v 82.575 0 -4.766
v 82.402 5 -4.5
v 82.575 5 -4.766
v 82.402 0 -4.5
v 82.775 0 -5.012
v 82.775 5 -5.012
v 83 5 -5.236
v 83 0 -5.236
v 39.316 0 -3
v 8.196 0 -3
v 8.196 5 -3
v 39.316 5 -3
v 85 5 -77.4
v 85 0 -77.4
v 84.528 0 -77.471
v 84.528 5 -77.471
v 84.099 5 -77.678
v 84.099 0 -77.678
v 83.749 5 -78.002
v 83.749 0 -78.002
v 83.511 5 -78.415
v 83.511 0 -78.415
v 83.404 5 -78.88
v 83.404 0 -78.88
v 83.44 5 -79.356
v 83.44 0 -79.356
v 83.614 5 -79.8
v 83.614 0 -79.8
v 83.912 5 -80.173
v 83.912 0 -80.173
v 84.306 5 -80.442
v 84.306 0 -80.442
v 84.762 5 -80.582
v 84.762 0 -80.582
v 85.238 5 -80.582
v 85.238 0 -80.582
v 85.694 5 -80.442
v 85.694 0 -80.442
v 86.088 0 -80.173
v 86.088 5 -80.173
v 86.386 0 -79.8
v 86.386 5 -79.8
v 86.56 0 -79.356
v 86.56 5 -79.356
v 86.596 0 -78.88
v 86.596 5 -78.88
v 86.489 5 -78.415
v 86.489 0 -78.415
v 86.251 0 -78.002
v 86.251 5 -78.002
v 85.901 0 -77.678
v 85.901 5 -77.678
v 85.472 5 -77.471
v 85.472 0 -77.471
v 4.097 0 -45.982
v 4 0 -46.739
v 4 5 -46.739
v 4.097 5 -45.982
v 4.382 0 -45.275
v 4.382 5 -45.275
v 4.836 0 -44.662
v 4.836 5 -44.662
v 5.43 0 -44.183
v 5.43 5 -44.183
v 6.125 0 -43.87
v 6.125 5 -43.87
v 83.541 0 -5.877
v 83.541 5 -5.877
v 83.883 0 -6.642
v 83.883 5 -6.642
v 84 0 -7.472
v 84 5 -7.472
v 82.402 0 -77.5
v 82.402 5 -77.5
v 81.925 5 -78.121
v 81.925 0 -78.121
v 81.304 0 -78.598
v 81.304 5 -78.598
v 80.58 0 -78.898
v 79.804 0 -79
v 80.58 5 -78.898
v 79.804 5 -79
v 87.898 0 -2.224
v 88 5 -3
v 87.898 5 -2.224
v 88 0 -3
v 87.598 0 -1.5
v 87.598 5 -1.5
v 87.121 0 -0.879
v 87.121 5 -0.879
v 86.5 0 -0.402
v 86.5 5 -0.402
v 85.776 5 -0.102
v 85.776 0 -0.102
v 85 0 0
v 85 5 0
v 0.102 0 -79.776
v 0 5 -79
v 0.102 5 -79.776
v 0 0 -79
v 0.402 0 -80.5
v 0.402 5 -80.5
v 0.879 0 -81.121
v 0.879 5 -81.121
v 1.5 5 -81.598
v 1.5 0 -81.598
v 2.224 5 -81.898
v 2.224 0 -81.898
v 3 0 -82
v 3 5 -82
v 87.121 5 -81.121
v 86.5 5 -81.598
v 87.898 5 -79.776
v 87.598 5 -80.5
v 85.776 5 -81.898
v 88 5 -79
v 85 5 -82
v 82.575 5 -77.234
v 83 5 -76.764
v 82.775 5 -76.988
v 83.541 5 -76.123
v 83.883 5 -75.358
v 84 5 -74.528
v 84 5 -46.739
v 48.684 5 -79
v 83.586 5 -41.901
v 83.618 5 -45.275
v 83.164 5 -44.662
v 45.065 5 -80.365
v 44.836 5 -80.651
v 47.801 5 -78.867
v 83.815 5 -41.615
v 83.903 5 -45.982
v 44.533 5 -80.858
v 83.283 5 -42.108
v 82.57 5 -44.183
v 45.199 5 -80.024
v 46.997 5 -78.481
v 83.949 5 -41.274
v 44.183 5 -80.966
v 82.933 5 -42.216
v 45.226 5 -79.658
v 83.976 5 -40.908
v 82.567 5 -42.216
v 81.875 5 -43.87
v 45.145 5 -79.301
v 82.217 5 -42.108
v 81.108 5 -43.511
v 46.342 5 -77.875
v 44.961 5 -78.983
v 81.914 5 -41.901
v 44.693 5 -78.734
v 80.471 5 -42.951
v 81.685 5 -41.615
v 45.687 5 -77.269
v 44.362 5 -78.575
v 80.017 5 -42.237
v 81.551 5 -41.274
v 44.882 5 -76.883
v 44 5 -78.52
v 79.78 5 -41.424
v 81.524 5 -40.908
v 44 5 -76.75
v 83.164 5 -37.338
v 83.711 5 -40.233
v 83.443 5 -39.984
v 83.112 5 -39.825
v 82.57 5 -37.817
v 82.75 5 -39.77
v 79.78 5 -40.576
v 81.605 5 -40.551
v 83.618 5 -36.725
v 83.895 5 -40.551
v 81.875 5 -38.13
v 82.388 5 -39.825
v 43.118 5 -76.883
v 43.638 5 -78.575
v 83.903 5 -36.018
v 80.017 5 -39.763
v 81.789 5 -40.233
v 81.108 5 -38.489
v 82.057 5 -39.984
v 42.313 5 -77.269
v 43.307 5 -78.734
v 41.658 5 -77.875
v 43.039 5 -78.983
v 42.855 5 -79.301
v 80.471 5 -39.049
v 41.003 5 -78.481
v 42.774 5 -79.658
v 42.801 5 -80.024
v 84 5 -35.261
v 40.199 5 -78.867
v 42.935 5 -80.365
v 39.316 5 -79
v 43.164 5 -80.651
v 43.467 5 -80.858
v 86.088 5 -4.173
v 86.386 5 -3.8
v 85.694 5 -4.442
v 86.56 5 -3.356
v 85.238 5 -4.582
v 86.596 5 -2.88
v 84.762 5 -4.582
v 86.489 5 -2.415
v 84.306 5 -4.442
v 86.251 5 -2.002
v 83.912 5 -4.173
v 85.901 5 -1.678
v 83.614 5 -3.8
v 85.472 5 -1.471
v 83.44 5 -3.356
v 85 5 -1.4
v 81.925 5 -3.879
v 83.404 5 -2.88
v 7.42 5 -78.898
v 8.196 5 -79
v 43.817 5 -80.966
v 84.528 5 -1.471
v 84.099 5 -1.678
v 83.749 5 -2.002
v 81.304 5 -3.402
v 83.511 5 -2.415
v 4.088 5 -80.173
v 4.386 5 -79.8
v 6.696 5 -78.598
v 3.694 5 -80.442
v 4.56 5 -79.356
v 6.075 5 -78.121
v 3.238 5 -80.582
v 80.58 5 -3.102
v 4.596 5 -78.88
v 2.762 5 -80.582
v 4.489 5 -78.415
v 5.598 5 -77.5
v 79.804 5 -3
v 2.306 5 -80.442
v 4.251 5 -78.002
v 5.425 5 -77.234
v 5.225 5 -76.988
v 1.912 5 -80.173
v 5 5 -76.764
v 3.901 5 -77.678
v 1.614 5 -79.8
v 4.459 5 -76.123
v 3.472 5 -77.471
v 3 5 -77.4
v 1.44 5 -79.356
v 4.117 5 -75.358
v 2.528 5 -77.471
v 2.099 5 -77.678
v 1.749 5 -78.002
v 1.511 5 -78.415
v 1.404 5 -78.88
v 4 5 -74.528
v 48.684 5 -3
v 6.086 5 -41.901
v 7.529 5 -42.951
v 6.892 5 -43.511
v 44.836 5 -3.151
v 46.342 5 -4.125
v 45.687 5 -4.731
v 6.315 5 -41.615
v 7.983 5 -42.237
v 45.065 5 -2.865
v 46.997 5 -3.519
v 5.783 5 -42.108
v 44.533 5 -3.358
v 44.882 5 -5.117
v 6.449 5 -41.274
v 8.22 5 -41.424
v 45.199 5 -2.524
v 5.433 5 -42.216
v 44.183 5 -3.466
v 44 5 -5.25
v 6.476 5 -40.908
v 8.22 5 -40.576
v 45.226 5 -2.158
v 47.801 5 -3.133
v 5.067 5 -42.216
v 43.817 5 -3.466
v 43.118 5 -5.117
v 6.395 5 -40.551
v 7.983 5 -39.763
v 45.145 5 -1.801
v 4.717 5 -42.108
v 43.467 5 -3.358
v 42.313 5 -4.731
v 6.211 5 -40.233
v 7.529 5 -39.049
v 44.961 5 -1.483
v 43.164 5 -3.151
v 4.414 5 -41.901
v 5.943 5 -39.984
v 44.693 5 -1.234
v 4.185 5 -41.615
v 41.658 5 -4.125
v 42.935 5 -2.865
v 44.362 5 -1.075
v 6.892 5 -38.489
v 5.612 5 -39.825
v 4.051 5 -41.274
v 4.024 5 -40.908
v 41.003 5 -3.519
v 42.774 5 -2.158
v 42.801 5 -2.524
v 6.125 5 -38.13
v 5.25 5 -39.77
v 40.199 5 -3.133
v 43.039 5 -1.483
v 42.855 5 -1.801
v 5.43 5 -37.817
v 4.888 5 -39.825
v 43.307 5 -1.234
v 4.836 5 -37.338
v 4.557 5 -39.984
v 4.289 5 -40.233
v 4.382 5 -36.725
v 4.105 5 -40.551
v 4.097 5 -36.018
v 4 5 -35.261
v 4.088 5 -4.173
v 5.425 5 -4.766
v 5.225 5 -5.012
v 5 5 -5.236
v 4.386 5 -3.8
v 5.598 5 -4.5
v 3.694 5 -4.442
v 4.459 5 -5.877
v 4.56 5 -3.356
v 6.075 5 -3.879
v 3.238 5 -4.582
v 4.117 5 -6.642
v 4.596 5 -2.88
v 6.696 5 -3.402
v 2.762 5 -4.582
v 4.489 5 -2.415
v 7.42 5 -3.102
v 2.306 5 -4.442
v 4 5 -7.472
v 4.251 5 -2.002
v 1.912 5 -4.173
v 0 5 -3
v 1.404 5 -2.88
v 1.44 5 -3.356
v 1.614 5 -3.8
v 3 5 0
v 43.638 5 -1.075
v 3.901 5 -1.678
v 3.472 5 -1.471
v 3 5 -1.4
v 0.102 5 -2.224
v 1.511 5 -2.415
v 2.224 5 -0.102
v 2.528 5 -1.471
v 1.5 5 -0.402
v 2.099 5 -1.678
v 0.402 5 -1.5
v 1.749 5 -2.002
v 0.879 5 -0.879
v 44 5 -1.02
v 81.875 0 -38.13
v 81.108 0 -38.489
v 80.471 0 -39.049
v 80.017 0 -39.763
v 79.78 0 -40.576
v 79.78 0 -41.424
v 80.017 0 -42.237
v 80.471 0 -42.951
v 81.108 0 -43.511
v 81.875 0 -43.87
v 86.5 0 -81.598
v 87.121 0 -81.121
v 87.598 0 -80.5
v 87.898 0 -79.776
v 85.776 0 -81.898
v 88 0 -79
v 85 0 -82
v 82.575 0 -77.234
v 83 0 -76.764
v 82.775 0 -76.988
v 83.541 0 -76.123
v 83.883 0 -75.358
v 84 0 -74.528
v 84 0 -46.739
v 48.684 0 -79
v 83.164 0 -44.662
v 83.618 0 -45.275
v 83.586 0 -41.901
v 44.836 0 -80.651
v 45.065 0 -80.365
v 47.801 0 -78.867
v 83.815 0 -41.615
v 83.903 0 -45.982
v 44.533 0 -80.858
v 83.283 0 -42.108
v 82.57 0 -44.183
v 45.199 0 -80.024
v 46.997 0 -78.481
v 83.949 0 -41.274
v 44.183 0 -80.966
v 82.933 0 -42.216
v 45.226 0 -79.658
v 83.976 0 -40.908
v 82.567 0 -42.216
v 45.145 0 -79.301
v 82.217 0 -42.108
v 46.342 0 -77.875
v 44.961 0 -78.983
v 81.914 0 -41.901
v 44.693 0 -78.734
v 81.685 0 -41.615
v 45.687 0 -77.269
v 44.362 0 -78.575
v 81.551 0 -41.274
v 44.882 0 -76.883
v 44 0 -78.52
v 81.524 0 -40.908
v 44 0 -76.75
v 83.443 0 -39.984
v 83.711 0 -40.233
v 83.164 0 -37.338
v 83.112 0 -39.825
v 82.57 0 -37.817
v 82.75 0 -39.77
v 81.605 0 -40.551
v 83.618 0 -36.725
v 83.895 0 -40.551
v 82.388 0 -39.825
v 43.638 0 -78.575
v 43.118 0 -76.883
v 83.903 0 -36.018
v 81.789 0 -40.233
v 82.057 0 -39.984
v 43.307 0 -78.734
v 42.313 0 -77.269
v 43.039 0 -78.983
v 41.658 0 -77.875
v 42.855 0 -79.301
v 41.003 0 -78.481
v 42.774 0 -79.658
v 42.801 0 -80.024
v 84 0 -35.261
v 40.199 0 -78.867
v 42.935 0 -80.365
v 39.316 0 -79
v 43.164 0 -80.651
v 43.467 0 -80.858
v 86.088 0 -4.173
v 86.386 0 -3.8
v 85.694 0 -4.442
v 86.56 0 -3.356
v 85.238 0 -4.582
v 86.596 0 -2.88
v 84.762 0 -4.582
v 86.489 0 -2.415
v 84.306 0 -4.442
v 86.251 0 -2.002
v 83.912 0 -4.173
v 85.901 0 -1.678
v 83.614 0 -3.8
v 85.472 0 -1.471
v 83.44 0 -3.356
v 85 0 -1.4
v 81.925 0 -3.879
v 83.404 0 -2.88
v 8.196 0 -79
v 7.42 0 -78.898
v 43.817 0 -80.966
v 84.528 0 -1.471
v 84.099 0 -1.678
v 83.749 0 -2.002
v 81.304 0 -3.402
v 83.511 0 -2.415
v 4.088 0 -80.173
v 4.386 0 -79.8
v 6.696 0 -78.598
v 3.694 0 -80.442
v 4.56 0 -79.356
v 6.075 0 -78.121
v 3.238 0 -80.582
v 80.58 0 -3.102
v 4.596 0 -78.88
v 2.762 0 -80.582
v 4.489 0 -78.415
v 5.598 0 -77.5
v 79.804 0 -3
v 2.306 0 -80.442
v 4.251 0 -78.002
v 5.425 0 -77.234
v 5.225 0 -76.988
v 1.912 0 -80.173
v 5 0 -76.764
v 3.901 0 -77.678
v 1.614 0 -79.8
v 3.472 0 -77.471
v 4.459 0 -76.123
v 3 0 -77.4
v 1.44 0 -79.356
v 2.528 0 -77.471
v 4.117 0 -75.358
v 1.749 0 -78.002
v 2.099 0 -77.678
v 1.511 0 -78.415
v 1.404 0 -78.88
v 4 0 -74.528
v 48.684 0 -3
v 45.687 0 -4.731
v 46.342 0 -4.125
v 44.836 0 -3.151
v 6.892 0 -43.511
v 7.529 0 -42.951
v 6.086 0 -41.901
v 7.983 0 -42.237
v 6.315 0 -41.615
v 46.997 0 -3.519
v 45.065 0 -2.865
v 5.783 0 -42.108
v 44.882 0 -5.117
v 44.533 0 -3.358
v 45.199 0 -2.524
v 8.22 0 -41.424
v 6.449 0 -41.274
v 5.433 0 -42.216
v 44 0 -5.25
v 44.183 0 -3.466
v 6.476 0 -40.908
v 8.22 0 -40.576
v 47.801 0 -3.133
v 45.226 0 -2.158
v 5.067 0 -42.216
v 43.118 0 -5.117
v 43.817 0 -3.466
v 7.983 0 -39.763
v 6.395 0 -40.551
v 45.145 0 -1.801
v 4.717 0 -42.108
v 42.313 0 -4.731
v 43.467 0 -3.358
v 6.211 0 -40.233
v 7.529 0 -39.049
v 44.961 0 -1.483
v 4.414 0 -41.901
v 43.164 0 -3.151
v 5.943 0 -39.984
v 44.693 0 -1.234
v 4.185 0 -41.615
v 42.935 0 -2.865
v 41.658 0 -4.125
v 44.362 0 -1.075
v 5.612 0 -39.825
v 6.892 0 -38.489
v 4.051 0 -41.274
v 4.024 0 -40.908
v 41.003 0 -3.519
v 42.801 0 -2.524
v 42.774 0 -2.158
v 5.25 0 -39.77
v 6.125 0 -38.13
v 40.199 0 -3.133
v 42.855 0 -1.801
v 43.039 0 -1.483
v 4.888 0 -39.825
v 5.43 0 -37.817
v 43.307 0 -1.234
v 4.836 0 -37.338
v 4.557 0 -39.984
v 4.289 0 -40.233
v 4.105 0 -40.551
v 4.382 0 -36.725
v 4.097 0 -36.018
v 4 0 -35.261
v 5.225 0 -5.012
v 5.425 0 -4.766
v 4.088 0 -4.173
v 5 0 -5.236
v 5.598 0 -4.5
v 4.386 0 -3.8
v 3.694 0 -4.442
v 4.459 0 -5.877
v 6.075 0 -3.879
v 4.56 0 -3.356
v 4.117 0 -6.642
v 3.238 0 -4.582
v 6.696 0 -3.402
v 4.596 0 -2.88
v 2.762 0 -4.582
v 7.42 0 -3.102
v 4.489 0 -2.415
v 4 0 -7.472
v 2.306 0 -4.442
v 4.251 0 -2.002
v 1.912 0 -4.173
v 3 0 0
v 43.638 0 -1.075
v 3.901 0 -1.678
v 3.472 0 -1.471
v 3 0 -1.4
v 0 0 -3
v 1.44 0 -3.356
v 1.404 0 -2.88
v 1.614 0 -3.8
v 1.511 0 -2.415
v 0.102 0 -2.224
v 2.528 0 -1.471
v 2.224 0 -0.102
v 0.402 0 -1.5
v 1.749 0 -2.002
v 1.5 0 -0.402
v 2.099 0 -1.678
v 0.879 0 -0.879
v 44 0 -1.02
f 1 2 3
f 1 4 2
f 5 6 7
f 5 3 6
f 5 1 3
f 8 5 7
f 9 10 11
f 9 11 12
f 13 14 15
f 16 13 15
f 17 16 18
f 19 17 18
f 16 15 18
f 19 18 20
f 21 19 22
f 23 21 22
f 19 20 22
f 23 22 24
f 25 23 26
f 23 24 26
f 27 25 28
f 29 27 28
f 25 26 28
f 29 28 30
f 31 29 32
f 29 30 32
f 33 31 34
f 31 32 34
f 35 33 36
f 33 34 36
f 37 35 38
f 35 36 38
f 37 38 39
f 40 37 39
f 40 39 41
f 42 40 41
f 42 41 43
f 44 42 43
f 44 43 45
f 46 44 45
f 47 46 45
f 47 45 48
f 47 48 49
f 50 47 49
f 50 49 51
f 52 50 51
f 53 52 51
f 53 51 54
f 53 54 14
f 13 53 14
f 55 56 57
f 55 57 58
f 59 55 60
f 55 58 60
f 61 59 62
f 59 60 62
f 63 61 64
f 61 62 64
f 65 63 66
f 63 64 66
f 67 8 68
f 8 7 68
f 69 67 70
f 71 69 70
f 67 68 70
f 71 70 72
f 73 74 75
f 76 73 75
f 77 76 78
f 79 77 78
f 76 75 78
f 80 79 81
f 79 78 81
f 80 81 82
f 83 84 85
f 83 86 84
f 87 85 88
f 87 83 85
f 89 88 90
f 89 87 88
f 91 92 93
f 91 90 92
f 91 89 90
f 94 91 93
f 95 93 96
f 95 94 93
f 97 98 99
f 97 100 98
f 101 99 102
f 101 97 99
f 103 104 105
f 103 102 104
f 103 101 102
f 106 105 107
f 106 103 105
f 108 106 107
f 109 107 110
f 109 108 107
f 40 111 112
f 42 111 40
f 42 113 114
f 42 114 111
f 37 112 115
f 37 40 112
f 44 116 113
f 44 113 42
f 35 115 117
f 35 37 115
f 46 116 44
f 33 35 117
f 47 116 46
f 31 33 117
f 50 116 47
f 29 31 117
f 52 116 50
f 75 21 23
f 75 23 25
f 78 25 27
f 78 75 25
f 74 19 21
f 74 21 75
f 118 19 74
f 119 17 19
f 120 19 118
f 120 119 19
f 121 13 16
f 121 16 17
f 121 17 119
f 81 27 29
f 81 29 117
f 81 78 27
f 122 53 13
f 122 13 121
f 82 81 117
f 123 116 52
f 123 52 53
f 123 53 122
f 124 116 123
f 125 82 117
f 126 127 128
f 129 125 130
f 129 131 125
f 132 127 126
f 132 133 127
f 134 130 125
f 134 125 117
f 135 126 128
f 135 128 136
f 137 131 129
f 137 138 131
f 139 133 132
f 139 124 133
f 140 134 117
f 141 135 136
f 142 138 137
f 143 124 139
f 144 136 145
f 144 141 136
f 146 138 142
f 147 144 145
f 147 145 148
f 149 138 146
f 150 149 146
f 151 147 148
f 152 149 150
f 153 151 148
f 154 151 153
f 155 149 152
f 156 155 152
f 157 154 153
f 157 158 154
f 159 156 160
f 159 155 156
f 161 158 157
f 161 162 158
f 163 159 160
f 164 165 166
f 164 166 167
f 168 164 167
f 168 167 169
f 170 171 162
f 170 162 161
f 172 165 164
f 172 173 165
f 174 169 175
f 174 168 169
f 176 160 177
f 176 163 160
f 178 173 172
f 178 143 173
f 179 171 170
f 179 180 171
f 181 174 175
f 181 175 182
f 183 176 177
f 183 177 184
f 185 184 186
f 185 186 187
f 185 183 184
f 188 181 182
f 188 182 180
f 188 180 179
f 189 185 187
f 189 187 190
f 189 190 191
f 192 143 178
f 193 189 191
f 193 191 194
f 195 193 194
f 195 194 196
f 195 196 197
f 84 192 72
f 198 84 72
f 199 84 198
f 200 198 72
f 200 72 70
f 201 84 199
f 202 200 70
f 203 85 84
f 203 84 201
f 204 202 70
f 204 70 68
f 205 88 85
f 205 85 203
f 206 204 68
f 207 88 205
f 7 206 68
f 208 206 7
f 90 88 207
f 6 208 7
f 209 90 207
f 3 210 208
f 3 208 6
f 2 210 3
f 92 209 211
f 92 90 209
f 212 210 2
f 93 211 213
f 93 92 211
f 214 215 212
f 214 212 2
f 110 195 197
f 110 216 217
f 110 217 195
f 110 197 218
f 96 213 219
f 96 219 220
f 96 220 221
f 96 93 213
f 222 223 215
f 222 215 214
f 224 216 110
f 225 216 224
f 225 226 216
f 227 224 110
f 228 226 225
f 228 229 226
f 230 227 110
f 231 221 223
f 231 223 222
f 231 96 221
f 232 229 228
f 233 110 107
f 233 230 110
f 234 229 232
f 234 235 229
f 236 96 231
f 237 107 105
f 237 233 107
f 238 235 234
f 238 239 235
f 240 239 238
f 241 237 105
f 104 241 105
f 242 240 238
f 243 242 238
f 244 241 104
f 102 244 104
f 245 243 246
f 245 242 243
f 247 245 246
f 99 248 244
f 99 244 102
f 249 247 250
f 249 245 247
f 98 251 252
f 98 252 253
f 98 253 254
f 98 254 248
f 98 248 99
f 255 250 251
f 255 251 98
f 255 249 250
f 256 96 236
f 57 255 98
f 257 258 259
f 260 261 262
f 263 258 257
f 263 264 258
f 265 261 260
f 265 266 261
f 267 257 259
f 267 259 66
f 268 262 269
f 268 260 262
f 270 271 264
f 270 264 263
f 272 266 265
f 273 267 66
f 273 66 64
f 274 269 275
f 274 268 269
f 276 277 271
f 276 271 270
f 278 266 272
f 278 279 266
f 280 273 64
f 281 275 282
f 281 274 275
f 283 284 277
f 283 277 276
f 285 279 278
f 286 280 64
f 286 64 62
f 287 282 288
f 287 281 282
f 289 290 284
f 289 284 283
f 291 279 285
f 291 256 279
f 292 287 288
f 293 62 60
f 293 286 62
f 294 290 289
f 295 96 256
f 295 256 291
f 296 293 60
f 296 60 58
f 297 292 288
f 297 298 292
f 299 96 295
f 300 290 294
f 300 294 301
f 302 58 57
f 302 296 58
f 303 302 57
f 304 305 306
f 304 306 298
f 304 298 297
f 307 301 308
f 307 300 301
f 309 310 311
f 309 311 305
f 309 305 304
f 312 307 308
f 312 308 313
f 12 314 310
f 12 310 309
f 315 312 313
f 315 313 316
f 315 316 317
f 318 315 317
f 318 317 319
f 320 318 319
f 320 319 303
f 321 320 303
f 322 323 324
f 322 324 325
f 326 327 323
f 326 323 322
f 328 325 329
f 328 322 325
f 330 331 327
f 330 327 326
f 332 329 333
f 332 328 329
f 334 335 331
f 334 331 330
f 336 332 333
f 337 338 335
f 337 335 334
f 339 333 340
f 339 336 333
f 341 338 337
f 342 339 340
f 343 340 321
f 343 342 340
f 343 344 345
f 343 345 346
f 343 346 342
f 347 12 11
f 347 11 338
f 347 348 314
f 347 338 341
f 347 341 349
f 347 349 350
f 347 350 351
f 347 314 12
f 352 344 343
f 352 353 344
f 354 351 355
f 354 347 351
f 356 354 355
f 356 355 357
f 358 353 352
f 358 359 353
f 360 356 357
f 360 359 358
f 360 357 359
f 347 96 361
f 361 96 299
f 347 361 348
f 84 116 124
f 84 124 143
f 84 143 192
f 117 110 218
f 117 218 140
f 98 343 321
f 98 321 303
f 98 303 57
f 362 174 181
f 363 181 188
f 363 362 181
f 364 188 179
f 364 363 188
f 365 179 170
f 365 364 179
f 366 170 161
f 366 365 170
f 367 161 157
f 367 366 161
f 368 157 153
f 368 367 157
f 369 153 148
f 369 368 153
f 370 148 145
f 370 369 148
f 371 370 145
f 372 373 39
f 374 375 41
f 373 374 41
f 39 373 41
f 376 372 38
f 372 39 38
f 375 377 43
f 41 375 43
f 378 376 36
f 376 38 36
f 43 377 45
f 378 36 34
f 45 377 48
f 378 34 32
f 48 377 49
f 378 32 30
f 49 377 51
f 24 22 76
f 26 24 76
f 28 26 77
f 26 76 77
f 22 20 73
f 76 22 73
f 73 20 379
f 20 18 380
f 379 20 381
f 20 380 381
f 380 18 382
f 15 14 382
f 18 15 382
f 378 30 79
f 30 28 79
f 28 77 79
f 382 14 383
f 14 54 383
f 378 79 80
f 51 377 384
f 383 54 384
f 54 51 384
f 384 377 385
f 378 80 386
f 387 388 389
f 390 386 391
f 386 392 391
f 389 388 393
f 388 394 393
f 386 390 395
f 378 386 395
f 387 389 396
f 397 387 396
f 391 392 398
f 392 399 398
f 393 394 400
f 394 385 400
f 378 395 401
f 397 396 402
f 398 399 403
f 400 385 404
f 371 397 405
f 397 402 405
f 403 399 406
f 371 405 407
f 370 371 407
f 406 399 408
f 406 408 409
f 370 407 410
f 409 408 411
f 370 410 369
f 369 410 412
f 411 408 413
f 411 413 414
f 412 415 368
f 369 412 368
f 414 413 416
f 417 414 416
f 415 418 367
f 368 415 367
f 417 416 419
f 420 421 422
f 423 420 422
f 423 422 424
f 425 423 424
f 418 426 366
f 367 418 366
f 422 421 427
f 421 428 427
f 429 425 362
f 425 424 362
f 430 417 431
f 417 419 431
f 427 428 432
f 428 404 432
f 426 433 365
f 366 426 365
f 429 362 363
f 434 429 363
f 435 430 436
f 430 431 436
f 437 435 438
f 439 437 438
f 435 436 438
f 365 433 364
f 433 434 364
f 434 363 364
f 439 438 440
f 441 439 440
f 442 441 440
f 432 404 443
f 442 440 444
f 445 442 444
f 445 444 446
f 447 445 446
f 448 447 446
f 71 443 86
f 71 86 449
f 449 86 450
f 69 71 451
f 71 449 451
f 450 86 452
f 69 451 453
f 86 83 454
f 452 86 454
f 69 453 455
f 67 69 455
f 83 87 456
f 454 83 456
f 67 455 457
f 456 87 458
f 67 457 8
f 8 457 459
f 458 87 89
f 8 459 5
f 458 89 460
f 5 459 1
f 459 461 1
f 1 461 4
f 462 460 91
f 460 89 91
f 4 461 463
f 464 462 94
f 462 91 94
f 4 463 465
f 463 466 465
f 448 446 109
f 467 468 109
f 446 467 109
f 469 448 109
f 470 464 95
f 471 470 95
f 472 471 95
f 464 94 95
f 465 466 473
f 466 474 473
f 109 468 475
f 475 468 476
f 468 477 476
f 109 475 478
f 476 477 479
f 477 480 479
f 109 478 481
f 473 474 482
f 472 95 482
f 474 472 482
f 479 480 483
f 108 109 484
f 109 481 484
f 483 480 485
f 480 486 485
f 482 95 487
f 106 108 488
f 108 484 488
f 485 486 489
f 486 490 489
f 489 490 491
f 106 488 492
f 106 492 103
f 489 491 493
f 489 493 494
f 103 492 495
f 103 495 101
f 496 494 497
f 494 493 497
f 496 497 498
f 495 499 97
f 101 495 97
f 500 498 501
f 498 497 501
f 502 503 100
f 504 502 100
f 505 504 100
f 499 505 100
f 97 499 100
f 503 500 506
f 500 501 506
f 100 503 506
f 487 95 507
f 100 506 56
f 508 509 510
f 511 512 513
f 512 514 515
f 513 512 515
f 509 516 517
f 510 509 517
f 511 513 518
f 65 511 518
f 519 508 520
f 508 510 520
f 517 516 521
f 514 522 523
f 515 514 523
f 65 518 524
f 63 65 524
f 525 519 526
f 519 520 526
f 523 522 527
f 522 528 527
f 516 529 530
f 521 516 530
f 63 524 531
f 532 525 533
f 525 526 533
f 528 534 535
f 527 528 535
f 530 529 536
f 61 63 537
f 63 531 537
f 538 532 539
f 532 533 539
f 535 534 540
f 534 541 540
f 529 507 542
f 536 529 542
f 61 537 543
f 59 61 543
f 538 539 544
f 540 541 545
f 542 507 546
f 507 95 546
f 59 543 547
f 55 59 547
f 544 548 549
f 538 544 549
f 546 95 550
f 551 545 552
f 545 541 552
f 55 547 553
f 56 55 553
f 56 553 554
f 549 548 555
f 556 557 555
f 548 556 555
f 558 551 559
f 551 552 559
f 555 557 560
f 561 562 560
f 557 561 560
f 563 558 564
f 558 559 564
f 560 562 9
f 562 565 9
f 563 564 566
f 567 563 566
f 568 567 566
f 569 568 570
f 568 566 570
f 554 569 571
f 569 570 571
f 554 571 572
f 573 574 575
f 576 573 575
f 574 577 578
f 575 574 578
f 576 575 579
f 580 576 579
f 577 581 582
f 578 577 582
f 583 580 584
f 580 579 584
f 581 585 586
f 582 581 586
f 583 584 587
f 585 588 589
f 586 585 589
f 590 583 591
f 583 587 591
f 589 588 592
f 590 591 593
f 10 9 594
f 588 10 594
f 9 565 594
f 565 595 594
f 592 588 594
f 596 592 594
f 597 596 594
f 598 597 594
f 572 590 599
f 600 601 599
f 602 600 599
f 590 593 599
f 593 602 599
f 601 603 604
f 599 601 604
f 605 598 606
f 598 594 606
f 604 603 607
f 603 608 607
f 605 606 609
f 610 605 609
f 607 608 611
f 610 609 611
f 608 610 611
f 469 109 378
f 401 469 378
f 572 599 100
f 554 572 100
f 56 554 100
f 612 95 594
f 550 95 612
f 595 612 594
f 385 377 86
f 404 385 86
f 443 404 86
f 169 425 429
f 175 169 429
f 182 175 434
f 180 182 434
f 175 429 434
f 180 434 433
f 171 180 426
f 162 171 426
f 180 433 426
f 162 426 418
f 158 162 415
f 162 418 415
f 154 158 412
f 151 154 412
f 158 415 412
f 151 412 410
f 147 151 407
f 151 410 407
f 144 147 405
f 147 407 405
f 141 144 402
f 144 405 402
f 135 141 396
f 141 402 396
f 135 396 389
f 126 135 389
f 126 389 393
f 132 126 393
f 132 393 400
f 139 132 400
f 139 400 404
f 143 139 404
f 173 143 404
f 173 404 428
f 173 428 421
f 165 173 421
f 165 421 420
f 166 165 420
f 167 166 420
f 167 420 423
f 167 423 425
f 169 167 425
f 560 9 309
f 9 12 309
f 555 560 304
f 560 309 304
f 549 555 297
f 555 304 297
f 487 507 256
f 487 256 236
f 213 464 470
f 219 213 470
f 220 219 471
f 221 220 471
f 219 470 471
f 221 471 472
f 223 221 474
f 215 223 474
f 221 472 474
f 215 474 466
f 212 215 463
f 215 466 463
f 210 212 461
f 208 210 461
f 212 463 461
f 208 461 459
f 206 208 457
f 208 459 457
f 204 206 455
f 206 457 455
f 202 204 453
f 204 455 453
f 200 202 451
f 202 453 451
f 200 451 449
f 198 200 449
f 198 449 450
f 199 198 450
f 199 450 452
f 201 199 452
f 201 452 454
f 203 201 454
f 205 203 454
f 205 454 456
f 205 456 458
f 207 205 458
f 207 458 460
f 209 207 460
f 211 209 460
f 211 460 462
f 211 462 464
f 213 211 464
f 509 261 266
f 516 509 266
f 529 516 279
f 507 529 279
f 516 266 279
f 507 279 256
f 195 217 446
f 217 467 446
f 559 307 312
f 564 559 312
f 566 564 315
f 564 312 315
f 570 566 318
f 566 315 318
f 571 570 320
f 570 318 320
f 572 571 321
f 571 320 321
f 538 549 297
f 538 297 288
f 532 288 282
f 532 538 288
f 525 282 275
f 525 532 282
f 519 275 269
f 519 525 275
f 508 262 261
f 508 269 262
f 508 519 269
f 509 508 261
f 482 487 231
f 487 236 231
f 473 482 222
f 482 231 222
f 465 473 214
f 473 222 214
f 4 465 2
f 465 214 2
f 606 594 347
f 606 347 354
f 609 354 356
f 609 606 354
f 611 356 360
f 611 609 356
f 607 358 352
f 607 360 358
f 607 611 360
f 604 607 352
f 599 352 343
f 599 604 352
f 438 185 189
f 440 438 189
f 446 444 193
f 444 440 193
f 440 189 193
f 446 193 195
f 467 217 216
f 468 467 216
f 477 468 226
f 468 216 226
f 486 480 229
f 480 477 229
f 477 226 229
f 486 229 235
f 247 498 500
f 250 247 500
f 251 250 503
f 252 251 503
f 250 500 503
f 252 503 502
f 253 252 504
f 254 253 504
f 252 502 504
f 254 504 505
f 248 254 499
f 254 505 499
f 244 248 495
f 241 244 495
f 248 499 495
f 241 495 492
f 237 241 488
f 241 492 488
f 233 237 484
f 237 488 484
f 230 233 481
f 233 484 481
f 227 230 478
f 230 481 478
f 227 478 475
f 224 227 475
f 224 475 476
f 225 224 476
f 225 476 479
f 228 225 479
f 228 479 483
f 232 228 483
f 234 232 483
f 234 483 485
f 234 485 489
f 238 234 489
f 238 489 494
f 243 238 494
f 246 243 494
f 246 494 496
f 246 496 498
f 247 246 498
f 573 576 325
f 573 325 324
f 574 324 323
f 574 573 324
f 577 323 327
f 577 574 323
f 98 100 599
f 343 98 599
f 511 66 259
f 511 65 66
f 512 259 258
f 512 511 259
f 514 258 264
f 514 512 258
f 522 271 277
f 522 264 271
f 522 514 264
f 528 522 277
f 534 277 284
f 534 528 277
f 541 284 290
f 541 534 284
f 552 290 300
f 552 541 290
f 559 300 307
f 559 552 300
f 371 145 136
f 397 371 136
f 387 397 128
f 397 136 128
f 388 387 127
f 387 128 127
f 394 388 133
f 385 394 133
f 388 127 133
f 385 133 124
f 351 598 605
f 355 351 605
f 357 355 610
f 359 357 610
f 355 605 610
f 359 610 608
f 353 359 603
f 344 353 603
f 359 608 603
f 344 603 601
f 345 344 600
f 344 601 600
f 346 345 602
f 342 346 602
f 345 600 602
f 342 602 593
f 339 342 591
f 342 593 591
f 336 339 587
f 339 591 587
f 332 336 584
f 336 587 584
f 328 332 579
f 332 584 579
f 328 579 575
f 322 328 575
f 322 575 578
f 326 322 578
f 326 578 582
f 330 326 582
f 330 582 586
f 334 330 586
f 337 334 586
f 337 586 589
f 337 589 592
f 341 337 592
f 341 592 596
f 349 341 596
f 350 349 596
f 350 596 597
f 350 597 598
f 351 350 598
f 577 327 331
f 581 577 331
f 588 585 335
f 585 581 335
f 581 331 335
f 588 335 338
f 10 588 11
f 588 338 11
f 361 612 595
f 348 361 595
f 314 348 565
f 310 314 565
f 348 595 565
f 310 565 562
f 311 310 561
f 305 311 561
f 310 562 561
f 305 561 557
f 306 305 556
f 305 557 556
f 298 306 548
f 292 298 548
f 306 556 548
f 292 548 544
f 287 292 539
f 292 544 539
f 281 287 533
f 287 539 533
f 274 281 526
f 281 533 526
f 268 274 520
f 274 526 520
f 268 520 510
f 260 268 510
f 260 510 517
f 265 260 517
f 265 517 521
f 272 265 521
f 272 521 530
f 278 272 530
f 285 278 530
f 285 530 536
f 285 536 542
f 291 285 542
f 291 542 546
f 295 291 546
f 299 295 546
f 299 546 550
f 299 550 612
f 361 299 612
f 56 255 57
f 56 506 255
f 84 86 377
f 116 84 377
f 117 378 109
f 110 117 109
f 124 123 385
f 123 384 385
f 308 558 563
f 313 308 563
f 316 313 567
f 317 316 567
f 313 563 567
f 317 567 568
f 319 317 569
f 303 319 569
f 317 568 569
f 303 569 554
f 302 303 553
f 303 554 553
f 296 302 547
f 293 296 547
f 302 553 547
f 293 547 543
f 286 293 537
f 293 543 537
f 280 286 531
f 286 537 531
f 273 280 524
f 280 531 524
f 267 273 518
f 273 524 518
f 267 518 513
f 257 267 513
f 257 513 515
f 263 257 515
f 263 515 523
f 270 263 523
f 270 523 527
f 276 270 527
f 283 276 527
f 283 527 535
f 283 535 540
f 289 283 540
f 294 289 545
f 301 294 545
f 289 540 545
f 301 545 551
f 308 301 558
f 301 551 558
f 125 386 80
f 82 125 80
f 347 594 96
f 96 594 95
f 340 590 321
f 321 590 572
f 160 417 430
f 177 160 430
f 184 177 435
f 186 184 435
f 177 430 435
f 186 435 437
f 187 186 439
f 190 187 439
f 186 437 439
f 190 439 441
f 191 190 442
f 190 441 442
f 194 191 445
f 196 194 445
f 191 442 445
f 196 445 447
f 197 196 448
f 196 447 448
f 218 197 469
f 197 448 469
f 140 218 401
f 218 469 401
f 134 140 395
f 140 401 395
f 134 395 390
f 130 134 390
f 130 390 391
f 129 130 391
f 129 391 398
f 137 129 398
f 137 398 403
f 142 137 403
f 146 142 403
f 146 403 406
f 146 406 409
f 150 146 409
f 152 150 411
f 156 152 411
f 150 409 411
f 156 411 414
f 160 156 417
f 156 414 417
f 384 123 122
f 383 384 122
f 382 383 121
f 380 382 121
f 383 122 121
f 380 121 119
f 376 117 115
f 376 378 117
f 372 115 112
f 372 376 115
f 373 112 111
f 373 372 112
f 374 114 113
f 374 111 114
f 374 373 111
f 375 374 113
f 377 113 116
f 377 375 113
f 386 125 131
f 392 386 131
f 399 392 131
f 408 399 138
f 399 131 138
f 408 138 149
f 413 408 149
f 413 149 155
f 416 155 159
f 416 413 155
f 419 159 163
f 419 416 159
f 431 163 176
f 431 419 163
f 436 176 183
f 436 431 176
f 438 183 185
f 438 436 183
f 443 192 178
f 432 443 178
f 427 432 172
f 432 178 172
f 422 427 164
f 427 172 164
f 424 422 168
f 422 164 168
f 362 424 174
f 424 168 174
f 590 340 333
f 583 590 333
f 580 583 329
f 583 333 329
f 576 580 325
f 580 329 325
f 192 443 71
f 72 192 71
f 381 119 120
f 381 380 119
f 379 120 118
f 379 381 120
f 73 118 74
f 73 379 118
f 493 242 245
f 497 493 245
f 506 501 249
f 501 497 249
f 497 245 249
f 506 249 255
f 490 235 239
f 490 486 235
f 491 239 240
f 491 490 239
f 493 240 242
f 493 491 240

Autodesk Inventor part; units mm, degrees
ref_plane "YZ Plane" through (0, 0, 0) normal (1, 0, 0) x (0, 1, 0)
ref_plane "XZ Plane" through (0, 0, 0) normal (0, 1, 0) x (-1, 0, 0)
ref_plane "XY Plane" through (0, 0, 0) normal (0, 0, 1) x (1, 0, 0)
sketch "Sketch4" plane through (0, 0, 0) normal (0, 1, 0) x (-1, 0, 0)
  line L0 (0, 0) -> (-88, 0)
  line L1 (-88, 0) -> (-88, -82)
  line L2 (-88, -82) -> (0, -82)
  line L3 (0, -82) -> (0, 0)
  line L4 (-2.25, -82.75) -> (-85.75, -82.75) construction
  line L5 (-85.75, -82.75) -> (-85.75, 0.75) construction
  line L6 (-85.75, 0.75) -> (-2.25, 0.75) construction
  line L7 (-2.25, 0.75) -> (-2.25, -82.75) construction
  circle A0 centre (-44, -79.75) radius 1.6 construction
  circle A1 centre (-82.75, -41) radius 1.6 construction
  circle A2 centre (-5.25, -41) radius 1.6 construction
  circle A3 centre (-44, -2.25) radius 1.6 construction
  arc A4 (-42.0157, -82) -> (-45.9843, -82) centre (-44, -79.75) ccw
  circle A5 centre (-5.25, -41) radius 3
  arc A6 (-45.9843, 0) -> (-42.0157, 0) centre (-44, -2.25) ccw
  circle A7 centre (-82.75, -41) radius 3
  circle A8 centre (-3, -79) radius 1.5 construction
  circle A9 centre (-3, -3) radius 1.5 construction
  circle A10 centre (-85, -3) radius 1.5 construction
  circle A11 centre (-85, -79) radius 1.5 construction
  circle A12 centre (-3, -3) radius 3
  circle A13 centre (-85, -3) radius 3
  circle A14 centre (-85, -79) radius 3
  circle A15 centre (-3, -79) radius 3
  line L8 (-6, -3) -> (-41.0953, -3)
  line L9 (-46.9047, -3) -> (-82, -3)
  line L10 (-84, -76.1716) -> (-84, -43.7272)
  line L11 (-46.9047, -79) -> (-82, -79)
  line L12 (-5.2437, -79) -> (-41.0953, -79)
  line L13 (-4, -76.1716) -> (-4, -43.7272)
  line L14 (-4, -5.8284) -> (-4, -38.2728)
  line L15 (-84, -38.2728) -> (-84, -5.8284)
  point P0 (-3, -82)
  point P1 (0, -79)
  point P2 (0, -3)
  point P3 (-3, 0)
  point P4 (-85, 0)
  point P5 (-88, -3)
  point P6 (-88, -79)
  point P7 (-85, -82)
  point P8 (-6, -79)
  dimension "d40" = 88
  dimension "d41" = 82
  dimension "d42" = 83.5
  dimension "d43" = 2.25
  dimension "d44" = 0.75
  dimension "d45" = 3.2
  dimension "d47" = 3
  dimension "d48" = 3
  dimension "d49" = 3
  dimension "d50" = 3
  dimension "d51" = 41
  dimension "d52" = 44
  dimension "d53" = 6
  dimension "d54" = 3
  dimension "d55" = 3
  dimension "d56" = 3
  dimension "d57" = 3
  dimension "d58" = 3
  dimension "d59" = 6
  dimension "d60" = 3
  dimension "d61" = 3
  dimension "d62" = 4
  dimension "d63" = 4
extrude "Extrusion2" add sketch "Sketch4" along normal blind 5 contours A6 L0 | L0 A12 L8 A6 | A6 L9 A13 L0 | A12 | A13 | L3 A15 L13 A5 L14 A12 | A13 L15 A7 L10 A14 L1 | A15 | A14 | L2 A4 L12 A15 | A5 | A7 | A14 L11 A4 L2 | L2 A4
sketch "Sketch5" plane through (0, 5, 0) normal (0, 1, 0) x (1, 0, 0)
  arc A0 (84, 43.7272) -> (84, 38.2728) centre (82.75, 41) ccw projected
  arc A1 (41.0953, 79) -> (46.9047, 79) centre (44, 79.75) ccw projected
  arc A2 (46.9047, 3) -> (41.0953, 3) centre (44, 2.25) ccw projected
  arc A3 (4, 38.2728) -> (4, 43.7272) centre (5.25, 41) ccw projected
  point P0 (0, 0)
hole "Hole3" at (44, 5, -79.75) at (82.75, 5, -41) at (44, 5, -2.25) at (5.25, 5, -41) direction (0, -1, 0) diameter 2.459 end through all thread size "M3x0.5" class "6H" standard "ANSI Metric M Profile"
sketch "Sketch6" plane through (0, 5, 0) normal (0, 1, 0) x (1, 0, 0)
  arc A0 (4, 76.1716) -> (6, 79) centre (3, 79) ccw projected
  arc A1 (6, 3) -> (4, 5.8284) centre (3, 3) ccw projected
  arc A2 (82, 79) -> (84, 76.1716) centre (85, 79) ccw projected
  arc A3 (84, 5.8284) -> (82, 3) centre (85, 3) ccw projected
  point P0 (0, 0)
hole "Hole4" at (85, 5, -79) at (85, 5, -3) at (3, 5, -3) at (3, 5, -79) direction (0, -1, 0) diameter 3.2 end through all clearance for "Flat Head Machine Screw" size "M3" standard "Ansi Metric M Profile"
fillet "Fillet2" radius 3 16 edges at (41.0953, 2.5, -79) (46.9047, 2.5, -79) (6, 2.5, -79) (4, 2.5, -76.1716) (4, 2.5, -43.7272) (4, 2.5, -38.2728) (82, 2.5, -79) (84, 2.5, -76.1716) (84, 2.5, -38.2728) (84, 2.5, -43.7272) (82, 2.5, -3) (84, 2.5, -5.8284) (41.0953, 2.5, -3) (46.9047, 2.5, -3) (6, 2.5, -3) (4, 2.5, -5.8284)
equation "\"d43\" = -0.5 * d42 + 0.5 * d40"
equation "\"d44\" = -0.5 * d41 + 0.5 * d42"
equation "\"d48\" = d47"
equation "\"d50\" = d49"
equation "\"d51\" = 0.5 * d41"
equation "\"d52\" = 0.5 * d40"
properties part number "ElectronicsBayMount" material "Aluminum 6061"
